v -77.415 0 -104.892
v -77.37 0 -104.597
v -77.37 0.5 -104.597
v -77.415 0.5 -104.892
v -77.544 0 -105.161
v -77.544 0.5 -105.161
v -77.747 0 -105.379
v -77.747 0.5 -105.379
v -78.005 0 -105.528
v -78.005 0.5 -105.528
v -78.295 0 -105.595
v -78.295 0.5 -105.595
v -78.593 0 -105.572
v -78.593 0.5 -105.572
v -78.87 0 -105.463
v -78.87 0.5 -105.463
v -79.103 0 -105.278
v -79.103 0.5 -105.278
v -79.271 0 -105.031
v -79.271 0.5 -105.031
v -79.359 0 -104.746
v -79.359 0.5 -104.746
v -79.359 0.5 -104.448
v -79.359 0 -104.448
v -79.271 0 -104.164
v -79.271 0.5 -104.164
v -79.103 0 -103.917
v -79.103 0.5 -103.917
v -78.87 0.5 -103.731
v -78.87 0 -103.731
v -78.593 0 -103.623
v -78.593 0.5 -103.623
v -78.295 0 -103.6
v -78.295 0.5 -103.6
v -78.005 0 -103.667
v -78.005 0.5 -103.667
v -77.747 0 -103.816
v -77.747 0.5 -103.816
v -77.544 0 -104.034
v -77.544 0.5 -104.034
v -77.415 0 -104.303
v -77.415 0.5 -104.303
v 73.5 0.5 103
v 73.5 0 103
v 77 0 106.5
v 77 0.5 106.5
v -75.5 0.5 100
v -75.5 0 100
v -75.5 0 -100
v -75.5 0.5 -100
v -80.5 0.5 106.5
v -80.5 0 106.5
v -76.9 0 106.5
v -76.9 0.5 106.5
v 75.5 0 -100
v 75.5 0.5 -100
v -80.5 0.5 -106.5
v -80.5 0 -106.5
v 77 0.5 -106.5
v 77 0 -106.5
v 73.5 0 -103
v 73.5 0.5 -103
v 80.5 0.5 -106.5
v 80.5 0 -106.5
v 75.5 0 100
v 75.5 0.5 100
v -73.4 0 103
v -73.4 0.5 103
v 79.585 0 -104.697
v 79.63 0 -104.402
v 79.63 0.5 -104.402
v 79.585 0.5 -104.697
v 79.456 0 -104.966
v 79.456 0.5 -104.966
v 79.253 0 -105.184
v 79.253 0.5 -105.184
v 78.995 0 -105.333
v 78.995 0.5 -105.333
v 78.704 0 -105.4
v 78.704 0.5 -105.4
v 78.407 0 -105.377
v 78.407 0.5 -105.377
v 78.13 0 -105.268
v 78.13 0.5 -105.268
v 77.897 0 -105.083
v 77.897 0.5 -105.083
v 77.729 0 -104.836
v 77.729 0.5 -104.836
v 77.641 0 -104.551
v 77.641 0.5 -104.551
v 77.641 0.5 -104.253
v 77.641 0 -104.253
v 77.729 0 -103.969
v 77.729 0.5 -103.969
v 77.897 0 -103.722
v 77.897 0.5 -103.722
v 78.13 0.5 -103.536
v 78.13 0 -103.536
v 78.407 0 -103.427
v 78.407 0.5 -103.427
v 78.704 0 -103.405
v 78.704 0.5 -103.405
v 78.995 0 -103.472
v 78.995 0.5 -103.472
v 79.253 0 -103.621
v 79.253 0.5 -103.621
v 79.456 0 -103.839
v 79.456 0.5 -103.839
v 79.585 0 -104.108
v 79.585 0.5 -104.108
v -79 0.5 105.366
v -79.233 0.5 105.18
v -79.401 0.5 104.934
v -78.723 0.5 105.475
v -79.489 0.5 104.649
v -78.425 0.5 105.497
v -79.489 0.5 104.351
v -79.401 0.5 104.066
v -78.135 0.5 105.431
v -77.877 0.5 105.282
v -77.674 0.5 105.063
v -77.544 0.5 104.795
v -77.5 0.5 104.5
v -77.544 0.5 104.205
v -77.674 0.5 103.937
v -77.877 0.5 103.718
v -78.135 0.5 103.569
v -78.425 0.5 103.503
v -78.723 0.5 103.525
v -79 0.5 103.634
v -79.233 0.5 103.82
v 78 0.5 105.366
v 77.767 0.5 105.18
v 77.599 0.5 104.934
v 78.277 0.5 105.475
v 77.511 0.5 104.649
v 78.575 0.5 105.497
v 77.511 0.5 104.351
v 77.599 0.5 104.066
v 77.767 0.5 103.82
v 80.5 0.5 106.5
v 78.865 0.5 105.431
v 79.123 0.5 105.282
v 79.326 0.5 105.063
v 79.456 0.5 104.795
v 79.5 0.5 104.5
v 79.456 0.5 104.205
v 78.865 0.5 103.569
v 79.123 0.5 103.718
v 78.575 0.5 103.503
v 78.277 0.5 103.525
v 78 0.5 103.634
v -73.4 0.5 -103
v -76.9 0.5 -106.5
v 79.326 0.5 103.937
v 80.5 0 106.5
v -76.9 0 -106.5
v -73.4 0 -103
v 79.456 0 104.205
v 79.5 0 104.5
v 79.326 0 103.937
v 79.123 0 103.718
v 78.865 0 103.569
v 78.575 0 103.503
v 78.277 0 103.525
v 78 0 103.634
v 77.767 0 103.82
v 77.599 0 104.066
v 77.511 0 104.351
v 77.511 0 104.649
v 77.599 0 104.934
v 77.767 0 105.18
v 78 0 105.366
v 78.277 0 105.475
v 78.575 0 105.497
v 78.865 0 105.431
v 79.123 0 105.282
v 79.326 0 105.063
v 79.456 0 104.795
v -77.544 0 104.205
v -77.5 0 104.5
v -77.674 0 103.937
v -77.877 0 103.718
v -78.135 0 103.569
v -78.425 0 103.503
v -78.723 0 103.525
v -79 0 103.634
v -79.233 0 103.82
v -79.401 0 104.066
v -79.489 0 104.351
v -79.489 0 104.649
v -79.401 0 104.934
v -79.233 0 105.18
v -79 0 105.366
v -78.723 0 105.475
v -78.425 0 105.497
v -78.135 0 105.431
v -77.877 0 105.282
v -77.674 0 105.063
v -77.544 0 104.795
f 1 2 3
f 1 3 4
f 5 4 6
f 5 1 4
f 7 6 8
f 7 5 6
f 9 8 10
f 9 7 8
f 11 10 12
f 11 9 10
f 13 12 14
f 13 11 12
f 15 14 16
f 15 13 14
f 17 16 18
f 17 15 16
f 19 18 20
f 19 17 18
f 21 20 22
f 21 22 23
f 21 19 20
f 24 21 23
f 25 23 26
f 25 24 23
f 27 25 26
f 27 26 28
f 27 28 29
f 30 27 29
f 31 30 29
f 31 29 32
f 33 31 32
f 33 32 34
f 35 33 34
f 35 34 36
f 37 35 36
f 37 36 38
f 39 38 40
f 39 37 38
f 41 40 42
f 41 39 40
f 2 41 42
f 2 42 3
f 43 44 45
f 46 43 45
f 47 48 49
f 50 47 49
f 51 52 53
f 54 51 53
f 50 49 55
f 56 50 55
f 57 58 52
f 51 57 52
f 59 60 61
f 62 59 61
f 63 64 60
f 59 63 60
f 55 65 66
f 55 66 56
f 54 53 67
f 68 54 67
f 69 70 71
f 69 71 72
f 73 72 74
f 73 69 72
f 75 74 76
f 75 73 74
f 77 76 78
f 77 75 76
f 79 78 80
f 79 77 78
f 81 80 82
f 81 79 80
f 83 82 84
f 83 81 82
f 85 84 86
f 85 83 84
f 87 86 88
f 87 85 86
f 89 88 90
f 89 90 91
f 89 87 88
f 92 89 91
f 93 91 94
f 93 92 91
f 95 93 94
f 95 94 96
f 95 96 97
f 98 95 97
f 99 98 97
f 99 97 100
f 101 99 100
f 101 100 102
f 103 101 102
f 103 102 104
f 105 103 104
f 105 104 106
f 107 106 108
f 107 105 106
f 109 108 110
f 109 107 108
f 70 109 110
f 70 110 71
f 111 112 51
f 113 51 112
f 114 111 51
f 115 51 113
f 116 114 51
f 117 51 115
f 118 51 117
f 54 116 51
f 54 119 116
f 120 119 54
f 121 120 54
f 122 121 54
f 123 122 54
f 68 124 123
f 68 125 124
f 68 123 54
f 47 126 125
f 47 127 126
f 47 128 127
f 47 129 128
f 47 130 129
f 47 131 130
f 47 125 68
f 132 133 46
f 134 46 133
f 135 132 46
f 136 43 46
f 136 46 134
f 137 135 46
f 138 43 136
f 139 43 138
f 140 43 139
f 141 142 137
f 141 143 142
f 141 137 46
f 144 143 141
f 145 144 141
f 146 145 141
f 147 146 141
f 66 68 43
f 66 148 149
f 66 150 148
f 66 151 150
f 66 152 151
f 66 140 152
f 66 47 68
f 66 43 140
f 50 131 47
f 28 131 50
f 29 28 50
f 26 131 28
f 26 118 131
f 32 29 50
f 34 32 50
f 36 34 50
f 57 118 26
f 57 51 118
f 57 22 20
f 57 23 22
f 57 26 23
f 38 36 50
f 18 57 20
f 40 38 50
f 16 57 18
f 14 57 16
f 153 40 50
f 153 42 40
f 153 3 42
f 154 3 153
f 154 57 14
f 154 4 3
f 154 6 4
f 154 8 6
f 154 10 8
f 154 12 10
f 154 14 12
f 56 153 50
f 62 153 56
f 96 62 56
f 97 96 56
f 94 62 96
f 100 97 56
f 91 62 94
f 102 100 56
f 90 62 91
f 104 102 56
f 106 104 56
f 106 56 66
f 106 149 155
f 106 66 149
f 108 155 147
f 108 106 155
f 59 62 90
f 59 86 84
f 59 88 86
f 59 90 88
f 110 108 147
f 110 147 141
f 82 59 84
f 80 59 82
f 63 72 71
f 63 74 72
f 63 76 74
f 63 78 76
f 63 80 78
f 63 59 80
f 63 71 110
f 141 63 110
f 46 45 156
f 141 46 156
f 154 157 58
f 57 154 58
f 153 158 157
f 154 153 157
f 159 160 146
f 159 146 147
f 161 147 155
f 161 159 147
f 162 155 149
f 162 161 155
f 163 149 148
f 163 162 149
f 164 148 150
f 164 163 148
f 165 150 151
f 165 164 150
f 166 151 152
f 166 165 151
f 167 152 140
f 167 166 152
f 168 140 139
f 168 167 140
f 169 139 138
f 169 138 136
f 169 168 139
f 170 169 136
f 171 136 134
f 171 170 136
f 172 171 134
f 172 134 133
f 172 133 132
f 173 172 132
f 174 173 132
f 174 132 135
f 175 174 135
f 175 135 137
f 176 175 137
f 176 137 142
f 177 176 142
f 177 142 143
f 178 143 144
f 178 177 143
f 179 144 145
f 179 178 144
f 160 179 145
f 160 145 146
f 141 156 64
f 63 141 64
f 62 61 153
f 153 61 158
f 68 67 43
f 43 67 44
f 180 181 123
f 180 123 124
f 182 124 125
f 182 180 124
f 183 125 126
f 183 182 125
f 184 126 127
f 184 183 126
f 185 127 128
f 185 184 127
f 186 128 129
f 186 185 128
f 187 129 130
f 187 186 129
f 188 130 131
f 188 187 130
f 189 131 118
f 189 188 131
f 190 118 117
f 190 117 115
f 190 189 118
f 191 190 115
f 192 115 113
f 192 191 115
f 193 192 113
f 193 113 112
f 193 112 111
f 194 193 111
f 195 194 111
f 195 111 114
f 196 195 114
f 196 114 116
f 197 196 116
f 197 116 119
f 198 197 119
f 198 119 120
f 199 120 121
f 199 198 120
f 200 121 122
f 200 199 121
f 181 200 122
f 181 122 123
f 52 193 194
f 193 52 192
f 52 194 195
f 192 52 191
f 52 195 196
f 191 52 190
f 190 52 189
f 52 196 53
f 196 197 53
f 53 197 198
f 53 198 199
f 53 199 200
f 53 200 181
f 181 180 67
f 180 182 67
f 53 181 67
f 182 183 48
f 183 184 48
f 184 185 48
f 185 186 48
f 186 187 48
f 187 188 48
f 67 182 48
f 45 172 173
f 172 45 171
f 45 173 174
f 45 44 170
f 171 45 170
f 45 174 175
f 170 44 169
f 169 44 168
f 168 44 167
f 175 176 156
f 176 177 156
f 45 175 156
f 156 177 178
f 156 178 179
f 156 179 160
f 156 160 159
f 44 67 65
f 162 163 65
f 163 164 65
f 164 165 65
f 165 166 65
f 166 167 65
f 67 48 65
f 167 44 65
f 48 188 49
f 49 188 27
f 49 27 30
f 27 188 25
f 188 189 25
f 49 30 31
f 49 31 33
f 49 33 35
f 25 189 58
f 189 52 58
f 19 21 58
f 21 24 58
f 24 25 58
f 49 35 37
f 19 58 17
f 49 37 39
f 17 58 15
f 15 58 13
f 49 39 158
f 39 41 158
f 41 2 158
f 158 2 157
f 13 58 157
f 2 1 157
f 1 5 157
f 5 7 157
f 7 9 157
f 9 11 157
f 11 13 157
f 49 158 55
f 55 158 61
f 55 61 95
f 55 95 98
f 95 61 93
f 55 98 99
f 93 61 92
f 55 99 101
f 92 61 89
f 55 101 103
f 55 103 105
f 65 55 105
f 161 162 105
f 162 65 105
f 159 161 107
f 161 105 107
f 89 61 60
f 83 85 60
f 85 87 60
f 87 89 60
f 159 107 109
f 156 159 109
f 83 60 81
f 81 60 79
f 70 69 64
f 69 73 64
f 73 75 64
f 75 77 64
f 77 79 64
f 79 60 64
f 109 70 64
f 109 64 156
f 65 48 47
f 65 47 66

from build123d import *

# Parameters (mm, degrees)
CROQUIS1_R              = 1
CROQUIS1_W              = 151
CROQUIS1_H              = 200
SALIENTE_EXTRUIR1_DEPTH = 0.5


with BuildPart() as part:
    # Croquis1 → Saliente-Extruir1 (new body)
    with BuildSketch(Plane(origin=(0, 0, 0), x_dir=(1, 0, 0), z_dir=(0, 1, 0))):
        Polygon((-80.5, -106.4), (-80.5, -106.5), (-80.4, -106.5), (-76.9, -106.5), (-73.4, -103), (73.5, -103), (77, -106.5), (80.5, -106.5), (80.5, 106.5), (77, 106.5), (73.5, 103), (-73.4, 103), (-76.9, 106.5), (-80.5, 106.5), align=None)
        with Locations((-78.5, -104.5)):
            Circle(CROQUIS1_R, mode=Mode.SUBTRACT)
        with Locations((78.5, -104.5)):
            Circle(CROQUIS1_R, mode=Mode.SUBTRACT)
        with Locations((78.629753046, 104.40240388)):
            Circle(CROQUIS1_R, mode=Mode.SUBTRACT)
        with Locations((-78.370125817, 104.597434861)):
            Circle(CROQUIS1_R, mode=Mode.SUBTRACT)
        Rectangle(CROQUIS1_W, CROQUIS1_H, mode=Mode.SUBTRACT)
    extrude(amount=SALIENTE_EXTRUIR1_DEPTH)


solid = part.part
